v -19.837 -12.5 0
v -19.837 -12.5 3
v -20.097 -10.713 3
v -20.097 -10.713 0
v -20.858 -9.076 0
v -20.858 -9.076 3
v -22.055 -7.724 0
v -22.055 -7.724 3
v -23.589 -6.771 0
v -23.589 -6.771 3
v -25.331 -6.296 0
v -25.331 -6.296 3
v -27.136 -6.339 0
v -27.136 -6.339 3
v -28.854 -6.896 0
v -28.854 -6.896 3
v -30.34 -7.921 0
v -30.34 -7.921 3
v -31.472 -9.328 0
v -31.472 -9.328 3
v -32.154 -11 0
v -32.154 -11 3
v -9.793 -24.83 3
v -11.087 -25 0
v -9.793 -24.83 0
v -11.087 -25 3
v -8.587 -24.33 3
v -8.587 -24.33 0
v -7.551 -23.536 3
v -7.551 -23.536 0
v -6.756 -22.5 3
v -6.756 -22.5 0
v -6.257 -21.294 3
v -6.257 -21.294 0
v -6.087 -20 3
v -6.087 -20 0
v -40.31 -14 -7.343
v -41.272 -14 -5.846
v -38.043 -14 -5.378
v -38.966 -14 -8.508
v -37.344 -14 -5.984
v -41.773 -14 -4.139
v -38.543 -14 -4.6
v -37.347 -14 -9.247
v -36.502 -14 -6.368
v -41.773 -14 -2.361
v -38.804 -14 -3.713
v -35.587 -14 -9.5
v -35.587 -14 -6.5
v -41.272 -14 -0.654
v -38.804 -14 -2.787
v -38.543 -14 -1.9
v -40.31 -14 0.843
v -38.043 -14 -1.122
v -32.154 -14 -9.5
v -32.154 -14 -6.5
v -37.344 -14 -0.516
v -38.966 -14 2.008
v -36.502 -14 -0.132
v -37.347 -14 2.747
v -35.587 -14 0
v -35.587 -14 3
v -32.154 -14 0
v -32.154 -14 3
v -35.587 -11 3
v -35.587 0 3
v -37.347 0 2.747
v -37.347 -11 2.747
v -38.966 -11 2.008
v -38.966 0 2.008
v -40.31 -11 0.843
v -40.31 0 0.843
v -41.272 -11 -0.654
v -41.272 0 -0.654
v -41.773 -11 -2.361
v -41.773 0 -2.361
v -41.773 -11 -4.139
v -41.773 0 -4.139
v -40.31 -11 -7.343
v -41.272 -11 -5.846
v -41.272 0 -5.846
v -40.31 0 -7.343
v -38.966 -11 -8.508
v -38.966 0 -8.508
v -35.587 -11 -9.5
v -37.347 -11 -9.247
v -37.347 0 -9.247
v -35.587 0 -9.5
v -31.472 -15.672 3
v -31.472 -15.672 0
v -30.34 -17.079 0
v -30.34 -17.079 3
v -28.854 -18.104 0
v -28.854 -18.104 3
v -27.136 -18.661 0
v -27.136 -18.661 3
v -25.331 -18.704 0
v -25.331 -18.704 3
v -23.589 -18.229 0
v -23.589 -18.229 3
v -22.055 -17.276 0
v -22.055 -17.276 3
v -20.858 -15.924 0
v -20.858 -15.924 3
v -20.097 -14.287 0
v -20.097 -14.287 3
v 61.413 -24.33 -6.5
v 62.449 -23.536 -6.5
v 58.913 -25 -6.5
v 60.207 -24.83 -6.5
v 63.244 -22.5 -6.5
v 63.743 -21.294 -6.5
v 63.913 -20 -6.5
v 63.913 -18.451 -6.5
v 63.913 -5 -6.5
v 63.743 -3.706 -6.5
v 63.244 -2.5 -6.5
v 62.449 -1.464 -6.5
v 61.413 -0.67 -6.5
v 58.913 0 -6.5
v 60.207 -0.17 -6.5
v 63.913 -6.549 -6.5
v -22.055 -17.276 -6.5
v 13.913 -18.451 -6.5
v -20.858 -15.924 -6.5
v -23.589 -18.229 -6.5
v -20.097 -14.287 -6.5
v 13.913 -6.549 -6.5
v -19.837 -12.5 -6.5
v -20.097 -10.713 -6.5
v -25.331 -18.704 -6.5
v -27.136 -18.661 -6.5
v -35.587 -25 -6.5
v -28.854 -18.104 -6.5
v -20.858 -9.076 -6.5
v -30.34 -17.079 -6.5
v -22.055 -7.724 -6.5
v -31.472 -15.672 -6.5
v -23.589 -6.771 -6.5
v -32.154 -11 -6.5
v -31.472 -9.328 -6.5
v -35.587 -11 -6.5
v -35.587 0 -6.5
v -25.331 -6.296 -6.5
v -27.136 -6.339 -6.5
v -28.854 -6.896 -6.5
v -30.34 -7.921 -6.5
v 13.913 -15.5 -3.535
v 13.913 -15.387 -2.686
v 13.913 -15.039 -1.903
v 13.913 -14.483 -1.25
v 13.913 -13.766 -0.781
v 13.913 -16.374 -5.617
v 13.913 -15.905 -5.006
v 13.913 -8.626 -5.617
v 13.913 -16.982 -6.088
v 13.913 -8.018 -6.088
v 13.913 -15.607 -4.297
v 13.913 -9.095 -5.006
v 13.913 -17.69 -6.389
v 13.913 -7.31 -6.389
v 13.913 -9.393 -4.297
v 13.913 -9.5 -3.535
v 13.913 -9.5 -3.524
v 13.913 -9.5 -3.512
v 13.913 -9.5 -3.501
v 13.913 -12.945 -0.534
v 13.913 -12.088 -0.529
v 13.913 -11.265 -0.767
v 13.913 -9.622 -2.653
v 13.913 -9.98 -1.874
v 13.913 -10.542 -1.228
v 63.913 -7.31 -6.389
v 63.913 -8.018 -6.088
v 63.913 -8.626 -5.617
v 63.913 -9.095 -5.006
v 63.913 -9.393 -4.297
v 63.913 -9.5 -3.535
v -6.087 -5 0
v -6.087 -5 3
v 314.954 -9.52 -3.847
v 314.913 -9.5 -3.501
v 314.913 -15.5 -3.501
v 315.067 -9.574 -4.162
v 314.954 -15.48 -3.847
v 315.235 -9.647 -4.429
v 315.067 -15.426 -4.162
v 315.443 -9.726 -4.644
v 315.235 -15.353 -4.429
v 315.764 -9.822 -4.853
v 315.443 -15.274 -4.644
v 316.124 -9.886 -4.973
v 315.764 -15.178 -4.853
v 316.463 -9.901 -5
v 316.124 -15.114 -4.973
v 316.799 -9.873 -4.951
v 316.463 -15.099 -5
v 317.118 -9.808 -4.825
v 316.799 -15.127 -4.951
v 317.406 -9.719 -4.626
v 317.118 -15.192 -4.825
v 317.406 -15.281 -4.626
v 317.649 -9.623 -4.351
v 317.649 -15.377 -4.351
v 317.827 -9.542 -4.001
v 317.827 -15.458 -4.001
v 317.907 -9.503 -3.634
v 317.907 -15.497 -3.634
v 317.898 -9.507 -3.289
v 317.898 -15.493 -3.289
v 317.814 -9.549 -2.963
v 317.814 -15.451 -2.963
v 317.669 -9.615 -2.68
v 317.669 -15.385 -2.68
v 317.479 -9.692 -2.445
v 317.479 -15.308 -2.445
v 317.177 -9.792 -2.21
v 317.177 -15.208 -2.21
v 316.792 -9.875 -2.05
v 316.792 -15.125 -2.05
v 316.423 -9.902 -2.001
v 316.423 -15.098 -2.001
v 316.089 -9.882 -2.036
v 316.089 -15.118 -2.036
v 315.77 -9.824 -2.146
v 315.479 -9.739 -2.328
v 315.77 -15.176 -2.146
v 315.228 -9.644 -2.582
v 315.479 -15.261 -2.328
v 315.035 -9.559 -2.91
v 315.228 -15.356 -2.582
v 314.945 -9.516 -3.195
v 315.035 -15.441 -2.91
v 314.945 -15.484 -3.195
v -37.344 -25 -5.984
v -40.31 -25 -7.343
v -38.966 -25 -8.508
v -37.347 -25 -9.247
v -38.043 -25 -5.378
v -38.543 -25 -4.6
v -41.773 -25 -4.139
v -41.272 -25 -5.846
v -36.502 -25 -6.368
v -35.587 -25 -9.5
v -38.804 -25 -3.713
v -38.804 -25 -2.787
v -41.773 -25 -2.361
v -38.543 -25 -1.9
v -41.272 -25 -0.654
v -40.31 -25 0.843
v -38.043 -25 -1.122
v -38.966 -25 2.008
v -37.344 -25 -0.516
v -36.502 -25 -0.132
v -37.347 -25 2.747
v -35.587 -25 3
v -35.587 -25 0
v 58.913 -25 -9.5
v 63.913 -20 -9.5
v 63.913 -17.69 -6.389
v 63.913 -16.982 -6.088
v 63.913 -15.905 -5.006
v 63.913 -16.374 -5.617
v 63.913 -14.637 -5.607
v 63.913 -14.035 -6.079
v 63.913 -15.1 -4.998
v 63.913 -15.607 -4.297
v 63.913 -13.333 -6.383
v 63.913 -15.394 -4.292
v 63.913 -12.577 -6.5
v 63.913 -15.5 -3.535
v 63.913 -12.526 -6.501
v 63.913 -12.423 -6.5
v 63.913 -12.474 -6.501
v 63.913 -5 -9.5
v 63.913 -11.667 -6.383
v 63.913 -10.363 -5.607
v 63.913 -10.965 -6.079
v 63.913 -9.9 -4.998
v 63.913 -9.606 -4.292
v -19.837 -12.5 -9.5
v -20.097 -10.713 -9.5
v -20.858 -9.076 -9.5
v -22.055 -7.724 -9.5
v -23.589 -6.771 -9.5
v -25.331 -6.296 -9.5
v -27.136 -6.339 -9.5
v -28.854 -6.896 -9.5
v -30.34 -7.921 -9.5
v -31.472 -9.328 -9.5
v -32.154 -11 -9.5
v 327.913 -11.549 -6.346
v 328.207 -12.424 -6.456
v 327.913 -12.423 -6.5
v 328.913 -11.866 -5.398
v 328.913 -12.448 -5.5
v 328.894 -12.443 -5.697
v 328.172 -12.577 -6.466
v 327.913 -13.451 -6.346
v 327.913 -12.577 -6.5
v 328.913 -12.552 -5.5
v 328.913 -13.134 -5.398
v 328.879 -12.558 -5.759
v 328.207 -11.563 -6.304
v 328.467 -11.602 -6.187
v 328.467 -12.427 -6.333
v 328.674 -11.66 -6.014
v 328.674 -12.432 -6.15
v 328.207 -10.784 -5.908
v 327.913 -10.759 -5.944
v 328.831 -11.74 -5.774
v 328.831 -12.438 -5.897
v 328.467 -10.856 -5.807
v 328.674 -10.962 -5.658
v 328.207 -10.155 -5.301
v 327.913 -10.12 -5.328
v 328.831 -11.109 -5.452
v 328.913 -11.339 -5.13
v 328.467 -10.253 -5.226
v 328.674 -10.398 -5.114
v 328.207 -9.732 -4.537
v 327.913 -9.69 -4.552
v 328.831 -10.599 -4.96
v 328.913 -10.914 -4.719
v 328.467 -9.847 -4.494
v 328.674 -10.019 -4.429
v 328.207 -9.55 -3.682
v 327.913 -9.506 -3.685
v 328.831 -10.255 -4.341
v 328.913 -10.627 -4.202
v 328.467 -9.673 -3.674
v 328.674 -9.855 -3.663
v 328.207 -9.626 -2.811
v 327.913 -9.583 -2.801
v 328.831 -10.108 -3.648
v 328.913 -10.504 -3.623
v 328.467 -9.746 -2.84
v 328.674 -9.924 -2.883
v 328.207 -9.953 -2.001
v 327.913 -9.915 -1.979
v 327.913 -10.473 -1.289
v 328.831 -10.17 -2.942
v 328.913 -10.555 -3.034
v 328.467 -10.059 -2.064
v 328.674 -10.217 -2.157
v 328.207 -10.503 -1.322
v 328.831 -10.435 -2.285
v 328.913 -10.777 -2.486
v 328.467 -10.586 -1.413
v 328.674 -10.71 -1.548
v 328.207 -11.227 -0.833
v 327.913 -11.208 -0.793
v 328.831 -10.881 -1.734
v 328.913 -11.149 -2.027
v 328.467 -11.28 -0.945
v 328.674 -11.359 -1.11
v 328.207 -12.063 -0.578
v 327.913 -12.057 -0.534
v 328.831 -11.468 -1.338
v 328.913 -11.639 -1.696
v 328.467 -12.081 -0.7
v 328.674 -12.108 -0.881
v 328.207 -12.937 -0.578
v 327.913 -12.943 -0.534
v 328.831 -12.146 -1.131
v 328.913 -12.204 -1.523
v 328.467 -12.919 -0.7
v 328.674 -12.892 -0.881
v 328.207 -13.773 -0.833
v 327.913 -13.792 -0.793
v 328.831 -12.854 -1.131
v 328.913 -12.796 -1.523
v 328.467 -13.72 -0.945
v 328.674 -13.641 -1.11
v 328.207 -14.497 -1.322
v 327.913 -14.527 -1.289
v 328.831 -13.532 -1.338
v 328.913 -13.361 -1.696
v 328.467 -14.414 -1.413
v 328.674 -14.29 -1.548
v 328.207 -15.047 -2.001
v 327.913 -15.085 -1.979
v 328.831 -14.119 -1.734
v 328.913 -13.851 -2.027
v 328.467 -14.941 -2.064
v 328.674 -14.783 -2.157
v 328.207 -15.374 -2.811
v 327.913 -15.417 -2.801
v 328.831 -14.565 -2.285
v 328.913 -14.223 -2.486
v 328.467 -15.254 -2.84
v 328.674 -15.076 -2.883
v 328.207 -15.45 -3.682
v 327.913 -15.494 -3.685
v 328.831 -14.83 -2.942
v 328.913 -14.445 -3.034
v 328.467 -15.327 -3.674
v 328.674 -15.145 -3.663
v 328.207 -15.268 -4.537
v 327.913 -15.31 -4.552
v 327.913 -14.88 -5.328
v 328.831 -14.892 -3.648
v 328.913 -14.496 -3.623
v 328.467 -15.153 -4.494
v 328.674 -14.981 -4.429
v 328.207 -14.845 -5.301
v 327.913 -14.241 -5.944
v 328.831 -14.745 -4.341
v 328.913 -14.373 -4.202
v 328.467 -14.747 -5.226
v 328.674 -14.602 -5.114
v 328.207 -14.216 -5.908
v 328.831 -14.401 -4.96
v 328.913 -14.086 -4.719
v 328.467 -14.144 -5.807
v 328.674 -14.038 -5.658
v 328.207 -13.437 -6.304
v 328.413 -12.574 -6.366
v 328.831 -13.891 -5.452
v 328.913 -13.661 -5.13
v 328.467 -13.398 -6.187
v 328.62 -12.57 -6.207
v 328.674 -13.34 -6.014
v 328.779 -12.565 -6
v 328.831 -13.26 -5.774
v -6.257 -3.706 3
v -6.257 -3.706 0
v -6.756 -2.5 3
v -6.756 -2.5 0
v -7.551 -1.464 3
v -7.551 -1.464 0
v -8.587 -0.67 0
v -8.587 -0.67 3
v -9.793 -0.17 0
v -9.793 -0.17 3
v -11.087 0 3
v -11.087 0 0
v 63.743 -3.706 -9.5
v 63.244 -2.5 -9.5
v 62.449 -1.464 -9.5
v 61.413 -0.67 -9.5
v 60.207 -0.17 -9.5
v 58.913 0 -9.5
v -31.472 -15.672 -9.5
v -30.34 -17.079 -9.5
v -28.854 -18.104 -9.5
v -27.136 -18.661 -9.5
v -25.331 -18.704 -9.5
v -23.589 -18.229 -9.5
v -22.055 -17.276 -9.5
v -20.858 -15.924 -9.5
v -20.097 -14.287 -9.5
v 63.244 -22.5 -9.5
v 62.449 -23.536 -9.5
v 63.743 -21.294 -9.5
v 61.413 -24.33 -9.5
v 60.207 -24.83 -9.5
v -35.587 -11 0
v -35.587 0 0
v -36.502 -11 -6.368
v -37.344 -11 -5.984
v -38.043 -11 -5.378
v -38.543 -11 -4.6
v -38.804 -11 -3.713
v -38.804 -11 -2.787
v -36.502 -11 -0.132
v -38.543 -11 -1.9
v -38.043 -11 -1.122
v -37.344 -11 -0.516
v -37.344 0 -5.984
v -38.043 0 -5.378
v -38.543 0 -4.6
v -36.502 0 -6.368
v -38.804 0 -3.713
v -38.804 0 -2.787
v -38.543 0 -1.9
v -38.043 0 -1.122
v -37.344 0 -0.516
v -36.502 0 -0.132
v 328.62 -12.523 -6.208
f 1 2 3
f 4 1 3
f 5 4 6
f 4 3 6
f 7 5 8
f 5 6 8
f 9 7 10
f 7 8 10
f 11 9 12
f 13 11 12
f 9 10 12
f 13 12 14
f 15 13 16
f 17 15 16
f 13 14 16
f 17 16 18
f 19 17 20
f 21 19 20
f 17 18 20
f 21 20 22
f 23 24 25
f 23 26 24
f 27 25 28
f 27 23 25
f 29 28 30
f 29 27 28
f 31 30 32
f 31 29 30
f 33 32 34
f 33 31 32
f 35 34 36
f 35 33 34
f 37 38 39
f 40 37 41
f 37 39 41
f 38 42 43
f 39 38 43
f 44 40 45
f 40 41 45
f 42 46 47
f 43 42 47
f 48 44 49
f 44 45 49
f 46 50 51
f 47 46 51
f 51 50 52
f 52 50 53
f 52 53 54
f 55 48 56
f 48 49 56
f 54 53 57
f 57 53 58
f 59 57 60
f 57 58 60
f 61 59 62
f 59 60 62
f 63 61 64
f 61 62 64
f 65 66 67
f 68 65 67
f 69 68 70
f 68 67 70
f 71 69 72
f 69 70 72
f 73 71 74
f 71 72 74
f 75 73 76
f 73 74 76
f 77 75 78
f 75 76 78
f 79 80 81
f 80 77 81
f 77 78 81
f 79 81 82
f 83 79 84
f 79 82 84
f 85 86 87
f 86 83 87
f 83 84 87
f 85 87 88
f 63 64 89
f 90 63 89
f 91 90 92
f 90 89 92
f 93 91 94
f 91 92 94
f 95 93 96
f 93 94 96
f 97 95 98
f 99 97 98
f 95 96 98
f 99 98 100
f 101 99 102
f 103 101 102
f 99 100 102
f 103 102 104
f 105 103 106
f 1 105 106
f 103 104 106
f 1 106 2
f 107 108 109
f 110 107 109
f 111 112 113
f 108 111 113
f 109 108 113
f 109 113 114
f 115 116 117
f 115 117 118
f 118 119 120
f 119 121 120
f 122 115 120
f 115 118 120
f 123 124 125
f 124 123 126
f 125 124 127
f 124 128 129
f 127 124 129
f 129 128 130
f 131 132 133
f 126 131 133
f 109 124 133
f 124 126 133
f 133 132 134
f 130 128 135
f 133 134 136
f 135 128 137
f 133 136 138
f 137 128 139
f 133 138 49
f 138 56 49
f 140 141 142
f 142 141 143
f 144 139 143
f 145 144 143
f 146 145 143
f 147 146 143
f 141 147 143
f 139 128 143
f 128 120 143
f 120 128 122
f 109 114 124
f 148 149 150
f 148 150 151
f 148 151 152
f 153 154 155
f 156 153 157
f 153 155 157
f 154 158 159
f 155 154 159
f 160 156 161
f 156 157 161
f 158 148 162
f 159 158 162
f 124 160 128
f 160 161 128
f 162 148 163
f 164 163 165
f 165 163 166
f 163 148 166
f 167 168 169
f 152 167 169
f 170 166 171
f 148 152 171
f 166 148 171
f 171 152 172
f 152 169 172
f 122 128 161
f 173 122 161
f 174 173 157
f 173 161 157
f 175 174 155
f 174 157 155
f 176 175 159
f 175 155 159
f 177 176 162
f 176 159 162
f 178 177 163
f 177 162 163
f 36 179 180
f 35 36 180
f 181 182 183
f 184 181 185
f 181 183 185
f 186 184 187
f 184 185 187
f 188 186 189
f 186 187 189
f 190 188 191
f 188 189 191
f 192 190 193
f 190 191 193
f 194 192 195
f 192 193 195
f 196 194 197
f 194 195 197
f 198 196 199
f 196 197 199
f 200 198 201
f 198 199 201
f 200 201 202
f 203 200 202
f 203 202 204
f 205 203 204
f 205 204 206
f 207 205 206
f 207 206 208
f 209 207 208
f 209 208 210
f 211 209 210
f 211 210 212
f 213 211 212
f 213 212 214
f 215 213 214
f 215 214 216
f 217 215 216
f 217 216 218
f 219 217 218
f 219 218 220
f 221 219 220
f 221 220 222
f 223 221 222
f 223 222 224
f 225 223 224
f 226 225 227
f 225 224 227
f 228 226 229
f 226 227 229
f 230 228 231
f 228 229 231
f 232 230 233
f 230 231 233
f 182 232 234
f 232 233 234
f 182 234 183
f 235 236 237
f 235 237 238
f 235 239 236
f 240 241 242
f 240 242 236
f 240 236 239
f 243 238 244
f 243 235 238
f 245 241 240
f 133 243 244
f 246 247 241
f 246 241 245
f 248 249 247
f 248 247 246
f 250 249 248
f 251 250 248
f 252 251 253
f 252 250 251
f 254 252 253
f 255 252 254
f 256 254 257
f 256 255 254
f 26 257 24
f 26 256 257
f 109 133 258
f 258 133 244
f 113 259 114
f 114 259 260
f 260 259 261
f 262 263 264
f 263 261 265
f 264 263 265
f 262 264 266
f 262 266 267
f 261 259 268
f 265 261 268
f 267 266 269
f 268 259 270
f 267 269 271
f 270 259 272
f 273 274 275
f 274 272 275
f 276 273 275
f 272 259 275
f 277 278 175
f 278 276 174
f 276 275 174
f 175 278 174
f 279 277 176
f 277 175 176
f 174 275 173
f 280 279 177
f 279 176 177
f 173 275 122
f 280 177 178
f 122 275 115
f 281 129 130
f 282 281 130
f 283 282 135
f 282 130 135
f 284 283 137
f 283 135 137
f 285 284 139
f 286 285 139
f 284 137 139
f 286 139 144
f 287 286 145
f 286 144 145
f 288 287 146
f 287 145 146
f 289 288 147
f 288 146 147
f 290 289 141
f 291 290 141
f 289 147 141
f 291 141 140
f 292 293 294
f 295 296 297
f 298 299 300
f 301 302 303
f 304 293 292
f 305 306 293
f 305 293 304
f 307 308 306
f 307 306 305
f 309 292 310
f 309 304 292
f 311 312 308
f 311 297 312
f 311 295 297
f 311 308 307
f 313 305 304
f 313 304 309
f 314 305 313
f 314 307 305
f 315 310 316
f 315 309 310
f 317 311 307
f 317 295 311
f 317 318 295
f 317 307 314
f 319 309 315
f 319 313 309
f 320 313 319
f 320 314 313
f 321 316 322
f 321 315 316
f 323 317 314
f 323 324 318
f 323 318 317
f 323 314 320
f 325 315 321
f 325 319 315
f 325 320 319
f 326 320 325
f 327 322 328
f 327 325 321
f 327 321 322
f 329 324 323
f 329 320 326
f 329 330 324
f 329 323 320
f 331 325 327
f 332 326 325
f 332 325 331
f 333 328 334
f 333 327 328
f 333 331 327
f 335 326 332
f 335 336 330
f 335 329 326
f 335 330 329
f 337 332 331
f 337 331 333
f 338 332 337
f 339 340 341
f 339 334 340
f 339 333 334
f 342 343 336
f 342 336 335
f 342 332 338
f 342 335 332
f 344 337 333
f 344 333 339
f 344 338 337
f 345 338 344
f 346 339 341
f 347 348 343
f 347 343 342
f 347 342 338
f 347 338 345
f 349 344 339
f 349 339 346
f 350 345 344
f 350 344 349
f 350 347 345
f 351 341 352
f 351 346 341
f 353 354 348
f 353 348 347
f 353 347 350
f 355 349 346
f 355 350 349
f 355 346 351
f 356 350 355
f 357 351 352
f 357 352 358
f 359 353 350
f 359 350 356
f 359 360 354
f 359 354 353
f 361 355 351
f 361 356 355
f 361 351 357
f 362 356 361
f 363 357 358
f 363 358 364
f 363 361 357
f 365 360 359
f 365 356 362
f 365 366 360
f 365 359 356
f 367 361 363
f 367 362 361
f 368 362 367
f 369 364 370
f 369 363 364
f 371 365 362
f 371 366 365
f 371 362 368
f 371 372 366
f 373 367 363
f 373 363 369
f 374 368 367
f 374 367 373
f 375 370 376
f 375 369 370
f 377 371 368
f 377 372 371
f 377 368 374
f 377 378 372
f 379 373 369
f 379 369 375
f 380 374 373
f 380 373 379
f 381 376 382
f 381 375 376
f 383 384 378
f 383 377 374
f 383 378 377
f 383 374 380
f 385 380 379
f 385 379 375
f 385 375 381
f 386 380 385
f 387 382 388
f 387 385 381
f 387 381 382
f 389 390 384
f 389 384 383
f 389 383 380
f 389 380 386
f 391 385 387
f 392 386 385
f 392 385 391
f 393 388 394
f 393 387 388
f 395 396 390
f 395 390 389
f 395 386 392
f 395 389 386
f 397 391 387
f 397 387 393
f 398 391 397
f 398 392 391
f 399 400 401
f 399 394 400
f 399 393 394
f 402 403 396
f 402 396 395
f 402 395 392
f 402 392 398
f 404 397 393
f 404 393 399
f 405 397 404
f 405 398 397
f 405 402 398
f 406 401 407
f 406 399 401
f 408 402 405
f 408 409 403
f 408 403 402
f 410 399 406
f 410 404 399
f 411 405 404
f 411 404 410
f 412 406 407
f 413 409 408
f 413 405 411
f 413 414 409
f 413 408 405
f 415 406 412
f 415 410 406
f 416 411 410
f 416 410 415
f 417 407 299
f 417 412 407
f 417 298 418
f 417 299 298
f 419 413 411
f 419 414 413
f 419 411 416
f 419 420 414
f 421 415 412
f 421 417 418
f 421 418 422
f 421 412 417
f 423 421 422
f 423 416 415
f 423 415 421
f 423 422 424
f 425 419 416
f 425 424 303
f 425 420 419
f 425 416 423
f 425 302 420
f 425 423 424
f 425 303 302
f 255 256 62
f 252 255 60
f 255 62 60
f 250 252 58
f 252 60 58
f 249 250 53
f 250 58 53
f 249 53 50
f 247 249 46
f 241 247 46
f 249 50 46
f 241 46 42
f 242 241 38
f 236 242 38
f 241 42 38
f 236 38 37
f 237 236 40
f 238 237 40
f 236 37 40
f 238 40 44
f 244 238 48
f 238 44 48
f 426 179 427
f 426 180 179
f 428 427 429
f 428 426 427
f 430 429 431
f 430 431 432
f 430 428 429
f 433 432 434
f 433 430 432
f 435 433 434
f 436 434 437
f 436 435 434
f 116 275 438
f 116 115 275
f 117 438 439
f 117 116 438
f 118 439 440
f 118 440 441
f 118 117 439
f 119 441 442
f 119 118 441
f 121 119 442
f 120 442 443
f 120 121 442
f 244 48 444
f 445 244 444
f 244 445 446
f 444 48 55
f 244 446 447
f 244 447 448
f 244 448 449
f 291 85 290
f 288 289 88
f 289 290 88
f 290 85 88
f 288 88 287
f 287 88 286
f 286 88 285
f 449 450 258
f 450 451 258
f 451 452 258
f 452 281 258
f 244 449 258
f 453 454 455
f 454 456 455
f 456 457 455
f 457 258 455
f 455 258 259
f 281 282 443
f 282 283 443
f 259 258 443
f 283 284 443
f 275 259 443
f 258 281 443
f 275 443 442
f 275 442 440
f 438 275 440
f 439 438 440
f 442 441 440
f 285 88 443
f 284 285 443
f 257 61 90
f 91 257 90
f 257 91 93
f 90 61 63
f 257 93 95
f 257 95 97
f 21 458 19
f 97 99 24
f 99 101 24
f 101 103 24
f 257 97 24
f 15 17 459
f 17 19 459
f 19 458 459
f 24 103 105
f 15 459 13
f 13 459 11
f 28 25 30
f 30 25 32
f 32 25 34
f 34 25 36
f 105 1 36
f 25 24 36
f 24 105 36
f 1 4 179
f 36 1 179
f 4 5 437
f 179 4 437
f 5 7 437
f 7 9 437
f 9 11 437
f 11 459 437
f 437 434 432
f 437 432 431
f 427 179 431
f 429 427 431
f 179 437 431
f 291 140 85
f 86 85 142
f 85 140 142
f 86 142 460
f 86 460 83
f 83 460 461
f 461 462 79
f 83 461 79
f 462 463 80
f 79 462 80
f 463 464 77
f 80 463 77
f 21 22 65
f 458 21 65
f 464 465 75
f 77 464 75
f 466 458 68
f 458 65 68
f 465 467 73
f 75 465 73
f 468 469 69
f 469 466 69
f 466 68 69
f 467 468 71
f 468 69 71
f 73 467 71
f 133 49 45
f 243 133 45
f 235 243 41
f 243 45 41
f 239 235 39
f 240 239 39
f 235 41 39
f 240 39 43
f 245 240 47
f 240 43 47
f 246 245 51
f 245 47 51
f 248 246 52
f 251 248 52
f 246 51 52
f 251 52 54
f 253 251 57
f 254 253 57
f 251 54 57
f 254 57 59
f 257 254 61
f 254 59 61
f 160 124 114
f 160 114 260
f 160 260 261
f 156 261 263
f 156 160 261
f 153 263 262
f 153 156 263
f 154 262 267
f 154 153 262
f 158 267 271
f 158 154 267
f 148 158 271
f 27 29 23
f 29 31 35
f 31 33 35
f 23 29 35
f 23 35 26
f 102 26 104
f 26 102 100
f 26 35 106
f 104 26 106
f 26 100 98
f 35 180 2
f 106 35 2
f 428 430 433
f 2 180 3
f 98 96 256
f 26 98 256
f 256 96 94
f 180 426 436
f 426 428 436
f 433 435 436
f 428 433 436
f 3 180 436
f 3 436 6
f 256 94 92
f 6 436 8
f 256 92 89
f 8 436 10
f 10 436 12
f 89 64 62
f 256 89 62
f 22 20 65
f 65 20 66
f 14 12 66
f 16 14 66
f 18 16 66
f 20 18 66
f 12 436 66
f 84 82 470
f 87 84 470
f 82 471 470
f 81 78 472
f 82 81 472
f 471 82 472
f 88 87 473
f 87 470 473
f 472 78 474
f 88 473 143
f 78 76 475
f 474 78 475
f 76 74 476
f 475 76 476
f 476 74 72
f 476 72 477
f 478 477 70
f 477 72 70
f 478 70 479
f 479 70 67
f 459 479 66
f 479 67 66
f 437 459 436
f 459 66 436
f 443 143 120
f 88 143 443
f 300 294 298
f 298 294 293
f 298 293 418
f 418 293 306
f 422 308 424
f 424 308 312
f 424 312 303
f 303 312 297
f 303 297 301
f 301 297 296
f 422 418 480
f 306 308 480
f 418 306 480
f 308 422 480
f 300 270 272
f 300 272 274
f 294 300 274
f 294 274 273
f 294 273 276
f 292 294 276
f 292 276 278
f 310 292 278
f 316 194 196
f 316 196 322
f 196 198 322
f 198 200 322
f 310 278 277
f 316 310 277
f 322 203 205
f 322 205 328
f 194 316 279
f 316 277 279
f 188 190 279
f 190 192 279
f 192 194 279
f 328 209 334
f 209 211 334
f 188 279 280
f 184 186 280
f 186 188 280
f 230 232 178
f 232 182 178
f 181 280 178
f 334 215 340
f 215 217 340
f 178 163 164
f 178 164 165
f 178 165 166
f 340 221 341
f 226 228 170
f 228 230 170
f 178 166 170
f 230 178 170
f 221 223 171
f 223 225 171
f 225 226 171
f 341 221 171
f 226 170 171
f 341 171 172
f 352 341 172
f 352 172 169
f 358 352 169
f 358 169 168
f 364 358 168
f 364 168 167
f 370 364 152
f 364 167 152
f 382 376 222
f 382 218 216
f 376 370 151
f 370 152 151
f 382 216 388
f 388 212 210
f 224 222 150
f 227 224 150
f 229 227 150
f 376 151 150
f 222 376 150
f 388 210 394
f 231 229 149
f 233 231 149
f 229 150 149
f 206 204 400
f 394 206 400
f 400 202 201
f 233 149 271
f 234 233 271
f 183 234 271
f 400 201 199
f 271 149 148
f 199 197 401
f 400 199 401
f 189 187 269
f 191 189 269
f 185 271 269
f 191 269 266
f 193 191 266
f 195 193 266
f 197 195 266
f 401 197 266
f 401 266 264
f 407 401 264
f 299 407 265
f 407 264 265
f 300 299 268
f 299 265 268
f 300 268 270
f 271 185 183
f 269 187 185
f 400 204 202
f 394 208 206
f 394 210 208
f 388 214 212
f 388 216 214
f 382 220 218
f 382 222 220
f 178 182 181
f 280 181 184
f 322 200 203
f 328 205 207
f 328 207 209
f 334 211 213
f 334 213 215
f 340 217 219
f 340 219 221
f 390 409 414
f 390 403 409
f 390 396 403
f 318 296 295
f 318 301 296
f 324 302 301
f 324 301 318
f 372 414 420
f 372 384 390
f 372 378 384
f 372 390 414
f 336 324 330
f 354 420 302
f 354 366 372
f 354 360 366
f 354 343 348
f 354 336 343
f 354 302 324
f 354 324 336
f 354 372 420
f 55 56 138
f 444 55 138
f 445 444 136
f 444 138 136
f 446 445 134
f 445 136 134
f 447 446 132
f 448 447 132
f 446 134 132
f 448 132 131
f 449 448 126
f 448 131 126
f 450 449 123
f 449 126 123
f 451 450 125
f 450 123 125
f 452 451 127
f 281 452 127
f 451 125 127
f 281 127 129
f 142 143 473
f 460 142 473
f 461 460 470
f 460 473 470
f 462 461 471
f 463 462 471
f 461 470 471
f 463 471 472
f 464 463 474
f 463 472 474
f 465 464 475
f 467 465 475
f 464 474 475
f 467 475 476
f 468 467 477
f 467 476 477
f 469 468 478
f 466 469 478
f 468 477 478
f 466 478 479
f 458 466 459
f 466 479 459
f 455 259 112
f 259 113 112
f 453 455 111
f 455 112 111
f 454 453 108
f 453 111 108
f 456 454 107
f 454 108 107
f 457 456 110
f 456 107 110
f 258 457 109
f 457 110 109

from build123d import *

# Parameters (mm, degrees)
F1_DEPTH      = 25
F3_DEPTH      = 12.501
F4_DEPTH      = 12.501
F7_DEPTH      = 270
F7_DEPTH_BACK = 45
F8_T1_DEPTH   = 45
F8_T3_DEPTH   = 5
F9_R          = 5
F10_R         = 1
F12_D         = 3


# Not quite as in the source:
# - a fillet or chamfer that OpenCascade refuses, or shapes differently, is made with other operations: its cross-section is extruded or revolved along the edge and cut away or added


with BuildPart() as f1:
    # F0 (on Front) → F1 (new body)
    with BuildSketch(Plane.XZ):
        with BuildLine():
            ThreePointArc((-35.5866095653, 3), (-41.8366095653, -3.25), (-35.5866095653, -9.5))
            Line((-35.5866095653, -9.5), (63.9133904347, -9.5))
            Line((63.9133904347, -9.5), (63.9133904347, -6.5))
            Line((63.9133904347, -6.5), (-35.5866095653, -6.5))
            ThreePointArc((-35.5866095653, -6.5), (-38.8366095653, -3.25), (-35.5866095653, 0))
            Line((-35.5866095653, 0), (-6.0866095653, 0))
            Line((-6.0866095653, 0), (-6.0866095653, 3))
            Line((-6.0866095653, 3), (-35.5866095653, 3))
        make_face()
    extrude(amount=F1_DEPTH)

    # F2 (on face) → F3 (cut, through all)
    with BuildSketch(Plane.XY.offset(3)):
        with BuildLine():
            ThreePointArc((-32.153940115, -14), (-25.3310686782, -18.7041645665), (-19.8366095653, -12.5))
            ThreePointArc((-19.8366095653, -12.5), (-25.3310686782, -6.2958354335), (-32.153940115, -11))
            ThreePointArc((-32.153940115, -11), (-32.3366095653, -12.5), (-32.153940115, -14))
        make_face()
    extrude(amount=-F3_DEPTH, mode=Mode.SUBTRACT)

    # F2 (on face) → F4 (cut, through all)
    with BuildSketch(Plane.XY.offset(3)):
        with BuildLine():
            ThreePointArc((-32.153940115, -14), (-25.3310686782, -18.7041645665), (-19.8366095653, -12.5))
            ThreePointArc((-19.8366095653, -12.5), (-25.3310686782, -6.2958354335), (-32.153940115, -11))
            ThreePointArc((-32.153940115, -11), (-32.3366095653, -12.5), (-32.153940115, -14))
        make_face()
        with BuildLine():
            ThreePointArc((-32.153940115, -14), (-32.3366095653, -12.5), (-32.153940115, -11))
            Line((-32.153940115, -11), (-41.9135839269, -11))
            Line((-41.9135839269, -11), (-41.9135839269, -14))
            Line((-41.9135839269, -14), (-32.153940115, -14))
        make_face()
    extrude(amount=-F4_DEPTH, mode=Mode.SUBTRACT)

    # F6 (on offset) → F7 (join, two sides)
    with BuildSketch(Plane.YZ.offset(58.9133904347)) as f7_sk:
        with BuildLine():
            ThreePointArc((-12.4225467883, -6.5), (-10.3514703126, -5.5947574316), (-9.5, -3.501))
            ThreePointArc((-9.5, -3.501), (-14.5937574316, -1.3524703126), (-12.5774532117, -6.5))
            Line((-12.5774532117, -6.5), (-12.4225467883, -6.5))
        make_face()
        with BuildLine():
            Line((-12.4225467883, -6.5), (-12.5774532117, -6.5))
            ThreePointArc((-12.5774532117, -6.5), (-12.5, -6.501), (-12.4225467883, -6.5))
        make_face()
    extrude(amount=F7_DEPTH)
    extrude(f7_sk.sketch, amount=-F7_DEPTH_BACK)

    # F8: fillet of radius 3 on 4 edges, made by hand

    # F8_s2 → F8_t1 (join)
    with BuildSketch(Plane.YZ.offset(13.9133904347)):
        with BuildLine():
            ThreePointArc((-18.5001459648, -6.5004), (-16.3786421293, -5.6217630236), (-15.4995999453, -3.5004270532))
            Line((-15.4995999453, -3.5004270532), (-15.1995453433, -3.500484366))
            ThreePointArc((-15.1995453433, -3.500484366), (-14.4336951193, -5.3852845615), (-12.5697064807, -6.2000454108))
            Line((-12.5697064807, -6.2000454108), (-12.5774532117, -6.8000546074))
            ThreePointArc((-12.5774532117, -6.8000546074), (-15.5387995882, -6.8000546074), (-18.5001459648, -6.8004546074))
            Line((-18.5001459648, -6.8004546074), (-18.5001459648, -6.5004))
        make_face()
        with BuildLine():
            ThreePointArc((-6.4998540352, -6.5004), (-8.6213578707, -5.6217630236), (-9.5004000547, -3.5004270532))
            Line((-9.5004000547, -3.5004270532), (-9.8004546567, -3.500484366))
            ThreePointArc((-9.8004546567, -3.500484366), (-10.5663048807, -5.3852845615), (-12.4302935193, -6.2000454108))
            Line((-12.4302935193, -6.2000454108), (-12.4225467883, -6.8000546074))
            ThreePointArc((-12.4225467883, -6.8000546074), (-9.4612004118, -6.8000546074), (-6.4998540352, -6.8004546074))
            Line((-6.4998540352, -6.8004546074), (-6.4998540352, -6.5004))
        make_face()
    extrude(amount=F8_T1_DEPTH)

    # F8_s4 → F8_t3 (join)
    with BuildSketch(Plane.YZ.offset(58.9133904347)):
        with BuildLine():
            ThreePointArc((-18.5001459648, -6.5004), (-16.3786421293, -5.6217630236), (-15.4995999453, -3.5004270532))
            Line((-15.4995999453, -3.5004270532), (-15.1995453433, -3.500484366))
            ThreePointArc((-15.1995453433, -3.500484366), (-14.4336951193, -5.3852845615), (-12.5697064807, -6.2000454108))
            Line((-12.5697064807, -6.2000454108), (-12.5774532117, -6.8000546074))
            ThreePointArc((-12.5774532117, -6.8000546074), (-15.5387995882, -6.8000546074), (-18.5001459648, -6.8004546074))
            Line((-18.5001459648, -6.8004546074), (-18.5001459648, -6.5004))
        make_face()
        with BuildLine():
            ThreePointArc((-6.4998540352, -6.5004), (-8.6213578707, -5.6217630236), (-9.5004000547, -3.5004270532))
            Line((-9.5004000547, -3.5004270532), (-9.8004546567, -3.500484366))
            ThreePointArc((-9.8004546567, -3.500484366), (-10.5663048807, -5.3852845615), (-12.4302935193, -6.2000454108))
            Line((-12.4302935193, -6.2000454108), (-12.4225467883, -6.8000546074))
            ThreePointArc((-12.4225467883, -6.8000546074), (-9.4612004118, -6.8000546074), (-6.4998540352, -6.8004546074))
            Line((-6.4998540352, -6.8004546074), (-6.4998540352, -6.5004))
        make_face()
    extrude(amount=F8_T3_DEPTH)

    # F9
    f9_edges = [f1.edges().sort_by_distance(p)[0] for p in [
        (63.91339, -25, -8),
        (63.91339, 0, -8),
        (-6.08661, 0, 1.5),
        (-6.08661, -25, 1.5),
    ]]
    fillet(f9_edges, radius=F9_R)

    # F10
    f10_edges = [f1.edges().sort_by_distance(p)[0] for p in [
        (328.91339, -15.5, -3.501),
    ]]
    fillet(f10_edges, radius=F10_R)

    # F12 (through all)
    with Locations(Plane(origin=(0, 0, 0), x_dir=(1, 0, 0), z_dir=(0, 1, 0))):
        with Locations((316.4133904347, 3.501)):
            Hole(F12_D / 2)


solid = f1.part
